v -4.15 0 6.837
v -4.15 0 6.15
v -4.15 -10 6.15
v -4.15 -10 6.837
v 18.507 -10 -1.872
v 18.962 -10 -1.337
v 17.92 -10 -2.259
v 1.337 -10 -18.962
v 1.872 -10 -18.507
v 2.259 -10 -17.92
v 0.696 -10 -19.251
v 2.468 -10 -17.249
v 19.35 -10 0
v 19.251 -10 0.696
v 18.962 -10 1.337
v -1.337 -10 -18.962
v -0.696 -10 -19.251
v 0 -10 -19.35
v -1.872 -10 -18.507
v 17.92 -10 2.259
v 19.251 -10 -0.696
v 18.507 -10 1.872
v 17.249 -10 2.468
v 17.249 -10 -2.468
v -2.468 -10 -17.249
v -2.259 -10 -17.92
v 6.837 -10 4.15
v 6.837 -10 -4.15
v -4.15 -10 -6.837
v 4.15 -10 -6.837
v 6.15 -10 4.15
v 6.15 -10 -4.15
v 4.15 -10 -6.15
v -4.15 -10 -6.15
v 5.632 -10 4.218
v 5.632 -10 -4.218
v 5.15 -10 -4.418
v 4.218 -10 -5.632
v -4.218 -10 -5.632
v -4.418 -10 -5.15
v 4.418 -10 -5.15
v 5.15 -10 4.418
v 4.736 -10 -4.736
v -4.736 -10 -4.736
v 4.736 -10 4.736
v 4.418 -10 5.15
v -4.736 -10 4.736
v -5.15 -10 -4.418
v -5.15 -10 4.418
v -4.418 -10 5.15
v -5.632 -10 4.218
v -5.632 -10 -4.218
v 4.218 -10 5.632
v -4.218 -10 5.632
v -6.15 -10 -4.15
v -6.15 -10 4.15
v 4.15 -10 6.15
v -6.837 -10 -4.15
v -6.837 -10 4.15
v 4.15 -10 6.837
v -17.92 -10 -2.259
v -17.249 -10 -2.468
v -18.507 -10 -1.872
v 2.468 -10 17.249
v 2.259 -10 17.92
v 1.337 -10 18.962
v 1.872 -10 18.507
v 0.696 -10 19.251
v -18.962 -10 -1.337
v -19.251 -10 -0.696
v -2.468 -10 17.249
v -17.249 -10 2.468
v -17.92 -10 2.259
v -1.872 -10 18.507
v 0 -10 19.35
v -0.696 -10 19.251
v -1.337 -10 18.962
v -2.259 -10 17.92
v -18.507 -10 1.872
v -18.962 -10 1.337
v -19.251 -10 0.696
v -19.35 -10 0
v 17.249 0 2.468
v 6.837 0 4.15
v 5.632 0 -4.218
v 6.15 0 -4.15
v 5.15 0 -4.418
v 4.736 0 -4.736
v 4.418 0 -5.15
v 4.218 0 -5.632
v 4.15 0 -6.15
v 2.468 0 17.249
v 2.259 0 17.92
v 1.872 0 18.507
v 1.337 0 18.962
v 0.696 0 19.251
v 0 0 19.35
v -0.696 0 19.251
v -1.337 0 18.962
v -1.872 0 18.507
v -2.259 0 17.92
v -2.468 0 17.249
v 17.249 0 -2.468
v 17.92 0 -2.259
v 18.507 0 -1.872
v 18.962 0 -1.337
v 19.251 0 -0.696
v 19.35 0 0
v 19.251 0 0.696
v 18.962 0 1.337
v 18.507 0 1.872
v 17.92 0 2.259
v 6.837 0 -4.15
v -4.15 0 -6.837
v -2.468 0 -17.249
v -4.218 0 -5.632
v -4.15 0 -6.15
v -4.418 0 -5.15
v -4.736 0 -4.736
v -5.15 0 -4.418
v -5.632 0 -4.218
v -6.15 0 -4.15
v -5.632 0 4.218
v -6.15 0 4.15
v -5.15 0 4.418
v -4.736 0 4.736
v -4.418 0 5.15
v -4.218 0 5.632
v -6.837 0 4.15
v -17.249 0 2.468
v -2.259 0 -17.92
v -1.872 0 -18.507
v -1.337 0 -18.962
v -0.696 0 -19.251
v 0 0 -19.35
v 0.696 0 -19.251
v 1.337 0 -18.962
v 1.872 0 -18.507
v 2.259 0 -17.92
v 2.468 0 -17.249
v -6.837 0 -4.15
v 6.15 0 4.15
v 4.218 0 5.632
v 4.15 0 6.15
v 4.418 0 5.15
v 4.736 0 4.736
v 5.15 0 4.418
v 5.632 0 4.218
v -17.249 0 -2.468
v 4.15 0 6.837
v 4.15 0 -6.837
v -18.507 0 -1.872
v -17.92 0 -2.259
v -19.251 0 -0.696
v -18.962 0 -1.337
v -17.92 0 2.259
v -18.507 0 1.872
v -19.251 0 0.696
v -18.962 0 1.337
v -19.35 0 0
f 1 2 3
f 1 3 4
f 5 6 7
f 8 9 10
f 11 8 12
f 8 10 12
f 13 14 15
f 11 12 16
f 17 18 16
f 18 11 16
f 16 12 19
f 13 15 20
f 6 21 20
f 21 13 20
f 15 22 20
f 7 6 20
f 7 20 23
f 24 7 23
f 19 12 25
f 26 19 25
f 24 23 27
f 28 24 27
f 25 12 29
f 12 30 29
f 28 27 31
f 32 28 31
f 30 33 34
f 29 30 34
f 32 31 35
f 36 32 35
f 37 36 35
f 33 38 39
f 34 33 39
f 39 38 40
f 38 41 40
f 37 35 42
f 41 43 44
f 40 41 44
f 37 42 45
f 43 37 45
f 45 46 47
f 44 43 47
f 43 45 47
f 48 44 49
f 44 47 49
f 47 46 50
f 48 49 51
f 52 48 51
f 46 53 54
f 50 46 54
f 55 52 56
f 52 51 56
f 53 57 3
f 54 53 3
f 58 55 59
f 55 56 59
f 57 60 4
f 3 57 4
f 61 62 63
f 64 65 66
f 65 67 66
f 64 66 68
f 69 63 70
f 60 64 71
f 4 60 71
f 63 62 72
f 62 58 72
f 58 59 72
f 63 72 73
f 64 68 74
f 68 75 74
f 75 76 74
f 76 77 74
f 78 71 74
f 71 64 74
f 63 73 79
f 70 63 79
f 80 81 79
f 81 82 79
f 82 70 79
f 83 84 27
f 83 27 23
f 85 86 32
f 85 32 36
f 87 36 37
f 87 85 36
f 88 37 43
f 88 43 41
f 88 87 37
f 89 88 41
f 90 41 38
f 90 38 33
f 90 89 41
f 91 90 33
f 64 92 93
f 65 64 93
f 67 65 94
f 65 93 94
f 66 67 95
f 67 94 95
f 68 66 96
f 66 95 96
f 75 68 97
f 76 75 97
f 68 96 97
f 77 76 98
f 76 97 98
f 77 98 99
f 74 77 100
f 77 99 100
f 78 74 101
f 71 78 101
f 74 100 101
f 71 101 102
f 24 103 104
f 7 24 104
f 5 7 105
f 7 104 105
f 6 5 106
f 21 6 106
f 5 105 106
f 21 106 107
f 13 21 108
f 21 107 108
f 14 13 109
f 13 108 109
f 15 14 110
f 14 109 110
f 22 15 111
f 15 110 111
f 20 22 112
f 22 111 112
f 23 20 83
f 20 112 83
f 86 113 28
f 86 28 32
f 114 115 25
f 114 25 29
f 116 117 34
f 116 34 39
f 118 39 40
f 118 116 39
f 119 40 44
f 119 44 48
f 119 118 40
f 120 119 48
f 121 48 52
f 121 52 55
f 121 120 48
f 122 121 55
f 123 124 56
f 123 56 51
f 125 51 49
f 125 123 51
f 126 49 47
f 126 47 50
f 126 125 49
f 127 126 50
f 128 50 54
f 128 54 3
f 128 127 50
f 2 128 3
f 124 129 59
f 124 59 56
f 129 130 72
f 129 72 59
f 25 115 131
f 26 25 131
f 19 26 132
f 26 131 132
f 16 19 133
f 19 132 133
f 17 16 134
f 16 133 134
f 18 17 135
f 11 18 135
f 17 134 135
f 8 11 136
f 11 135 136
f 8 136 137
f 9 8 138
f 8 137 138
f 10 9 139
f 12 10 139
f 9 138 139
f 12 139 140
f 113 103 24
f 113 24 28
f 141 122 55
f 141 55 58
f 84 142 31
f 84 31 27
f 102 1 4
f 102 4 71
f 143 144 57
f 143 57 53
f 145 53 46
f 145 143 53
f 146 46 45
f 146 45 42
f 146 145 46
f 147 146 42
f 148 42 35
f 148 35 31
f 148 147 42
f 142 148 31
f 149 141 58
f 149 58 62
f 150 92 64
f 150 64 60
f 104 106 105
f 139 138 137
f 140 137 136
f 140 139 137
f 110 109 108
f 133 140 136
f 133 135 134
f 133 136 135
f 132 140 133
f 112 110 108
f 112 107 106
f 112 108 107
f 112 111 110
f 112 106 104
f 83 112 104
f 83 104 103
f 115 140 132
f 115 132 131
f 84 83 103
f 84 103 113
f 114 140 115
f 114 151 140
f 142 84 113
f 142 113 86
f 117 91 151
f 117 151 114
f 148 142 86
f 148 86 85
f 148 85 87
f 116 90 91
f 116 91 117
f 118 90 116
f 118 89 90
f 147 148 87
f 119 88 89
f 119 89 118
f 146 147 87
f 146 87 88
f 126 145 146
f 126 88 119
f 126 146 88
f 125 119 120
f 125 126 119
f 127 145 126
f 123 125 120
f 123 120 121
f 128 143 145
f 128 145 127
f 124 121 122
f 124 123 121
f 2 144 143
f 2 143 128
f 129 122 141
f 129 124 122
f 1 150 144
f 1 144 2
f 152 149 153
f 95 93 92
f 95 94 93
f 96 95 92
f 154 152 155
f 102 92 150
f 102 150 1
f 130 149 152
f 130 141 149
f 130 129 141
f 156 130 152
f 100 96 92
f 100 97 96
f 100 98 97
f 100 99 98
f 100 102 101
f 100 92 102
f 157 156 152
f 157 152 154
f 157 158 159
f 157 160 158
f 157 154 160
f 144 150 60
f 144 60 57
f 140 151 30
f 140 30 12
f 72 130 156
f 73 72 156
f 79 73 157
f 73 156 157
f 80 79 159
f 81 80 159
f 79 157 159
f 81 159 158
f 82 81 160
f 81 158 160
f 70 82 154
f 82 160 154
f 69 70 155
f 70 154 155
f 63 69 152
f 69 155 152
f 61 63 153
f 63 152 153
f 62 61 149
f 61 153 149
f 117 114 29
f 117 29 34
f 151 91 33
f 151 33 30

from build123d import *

# Parameters (mm, degrees)
PAD_DEPTH = 10


with BuildPart() as part:
    # Sketch → Pad (new body)
    with BuildSketch(Plane.XZ):
        with BuildLine():
            Line((-6.836766, 4.15), (-6.15, 4.15))
            ThreePointArc((-6.15, 4.15), (-4.735786, 4.735786), (-4.15, 6.15))
            Line((-4.15, 6.15), (-4.15, 6.836766))
            Line((-4.15, 6.836766), (-2.468004, 17.248694))
            ThreePointArc((2.468004, 17.248694), (0, 19.35), (-2.468004, 17.248694))
            Line((2.468004, 17.248694), (4.15, 6.836766))
            Line((4.15, 6.836766), (4.15, 6.15))
            ThreePointArc((4.15, 6.15), (4.735786, 4.735786), (6.15, 4.15))
            Line((6.15, 4.15), (6.836766, 4.15))
            Line((6.836766, 4.15), (17.248715, 2.468004))
            ThreePointArc((17.248715, -2.468004), (19.350021, 0), (17.248715, 2.468004))
            Line((17.248715, -2.468004), (6.836766, -4.15))
            Line((6.836766, -4.15), (6.15, -4.15))
            ThreePointArc((6.15, -4.15), (4.735786, -4.735786), (4.15, -6.15))
            Line((4.15, -6.15), (4.15, -6.836766))
            Line((4.15, -6.836766), (2.468004, -17.248694))
            ThreePointArc((-2.468004, -17.248694), (0, -19.35), (2.468004, -17.248694))
            Line((-2.468004, -17.248694), (-4.15, -6.836766))
            Line((-4.15, -6.836766), (-4.15, -6.15))
            ThreePointArc((-4.15, -6.15), (-4.735786, -4.735786), (-6.15, -4.15))
            Line((-6.15, -4.15), (-6.836766, -4.15))
            Line((-6.836766, -4.15), (-17.248715, -2.468004))
            ThreePointArc((-17.248715, 2.468004), (-19.350021, 0), (-17.248715, -2.468004))
            Line((-17.248715, 2.468004), (-6.836766, 4.15))
        make_face()
    extrude(amount=PAD_DEPTH)


solid = part.part
